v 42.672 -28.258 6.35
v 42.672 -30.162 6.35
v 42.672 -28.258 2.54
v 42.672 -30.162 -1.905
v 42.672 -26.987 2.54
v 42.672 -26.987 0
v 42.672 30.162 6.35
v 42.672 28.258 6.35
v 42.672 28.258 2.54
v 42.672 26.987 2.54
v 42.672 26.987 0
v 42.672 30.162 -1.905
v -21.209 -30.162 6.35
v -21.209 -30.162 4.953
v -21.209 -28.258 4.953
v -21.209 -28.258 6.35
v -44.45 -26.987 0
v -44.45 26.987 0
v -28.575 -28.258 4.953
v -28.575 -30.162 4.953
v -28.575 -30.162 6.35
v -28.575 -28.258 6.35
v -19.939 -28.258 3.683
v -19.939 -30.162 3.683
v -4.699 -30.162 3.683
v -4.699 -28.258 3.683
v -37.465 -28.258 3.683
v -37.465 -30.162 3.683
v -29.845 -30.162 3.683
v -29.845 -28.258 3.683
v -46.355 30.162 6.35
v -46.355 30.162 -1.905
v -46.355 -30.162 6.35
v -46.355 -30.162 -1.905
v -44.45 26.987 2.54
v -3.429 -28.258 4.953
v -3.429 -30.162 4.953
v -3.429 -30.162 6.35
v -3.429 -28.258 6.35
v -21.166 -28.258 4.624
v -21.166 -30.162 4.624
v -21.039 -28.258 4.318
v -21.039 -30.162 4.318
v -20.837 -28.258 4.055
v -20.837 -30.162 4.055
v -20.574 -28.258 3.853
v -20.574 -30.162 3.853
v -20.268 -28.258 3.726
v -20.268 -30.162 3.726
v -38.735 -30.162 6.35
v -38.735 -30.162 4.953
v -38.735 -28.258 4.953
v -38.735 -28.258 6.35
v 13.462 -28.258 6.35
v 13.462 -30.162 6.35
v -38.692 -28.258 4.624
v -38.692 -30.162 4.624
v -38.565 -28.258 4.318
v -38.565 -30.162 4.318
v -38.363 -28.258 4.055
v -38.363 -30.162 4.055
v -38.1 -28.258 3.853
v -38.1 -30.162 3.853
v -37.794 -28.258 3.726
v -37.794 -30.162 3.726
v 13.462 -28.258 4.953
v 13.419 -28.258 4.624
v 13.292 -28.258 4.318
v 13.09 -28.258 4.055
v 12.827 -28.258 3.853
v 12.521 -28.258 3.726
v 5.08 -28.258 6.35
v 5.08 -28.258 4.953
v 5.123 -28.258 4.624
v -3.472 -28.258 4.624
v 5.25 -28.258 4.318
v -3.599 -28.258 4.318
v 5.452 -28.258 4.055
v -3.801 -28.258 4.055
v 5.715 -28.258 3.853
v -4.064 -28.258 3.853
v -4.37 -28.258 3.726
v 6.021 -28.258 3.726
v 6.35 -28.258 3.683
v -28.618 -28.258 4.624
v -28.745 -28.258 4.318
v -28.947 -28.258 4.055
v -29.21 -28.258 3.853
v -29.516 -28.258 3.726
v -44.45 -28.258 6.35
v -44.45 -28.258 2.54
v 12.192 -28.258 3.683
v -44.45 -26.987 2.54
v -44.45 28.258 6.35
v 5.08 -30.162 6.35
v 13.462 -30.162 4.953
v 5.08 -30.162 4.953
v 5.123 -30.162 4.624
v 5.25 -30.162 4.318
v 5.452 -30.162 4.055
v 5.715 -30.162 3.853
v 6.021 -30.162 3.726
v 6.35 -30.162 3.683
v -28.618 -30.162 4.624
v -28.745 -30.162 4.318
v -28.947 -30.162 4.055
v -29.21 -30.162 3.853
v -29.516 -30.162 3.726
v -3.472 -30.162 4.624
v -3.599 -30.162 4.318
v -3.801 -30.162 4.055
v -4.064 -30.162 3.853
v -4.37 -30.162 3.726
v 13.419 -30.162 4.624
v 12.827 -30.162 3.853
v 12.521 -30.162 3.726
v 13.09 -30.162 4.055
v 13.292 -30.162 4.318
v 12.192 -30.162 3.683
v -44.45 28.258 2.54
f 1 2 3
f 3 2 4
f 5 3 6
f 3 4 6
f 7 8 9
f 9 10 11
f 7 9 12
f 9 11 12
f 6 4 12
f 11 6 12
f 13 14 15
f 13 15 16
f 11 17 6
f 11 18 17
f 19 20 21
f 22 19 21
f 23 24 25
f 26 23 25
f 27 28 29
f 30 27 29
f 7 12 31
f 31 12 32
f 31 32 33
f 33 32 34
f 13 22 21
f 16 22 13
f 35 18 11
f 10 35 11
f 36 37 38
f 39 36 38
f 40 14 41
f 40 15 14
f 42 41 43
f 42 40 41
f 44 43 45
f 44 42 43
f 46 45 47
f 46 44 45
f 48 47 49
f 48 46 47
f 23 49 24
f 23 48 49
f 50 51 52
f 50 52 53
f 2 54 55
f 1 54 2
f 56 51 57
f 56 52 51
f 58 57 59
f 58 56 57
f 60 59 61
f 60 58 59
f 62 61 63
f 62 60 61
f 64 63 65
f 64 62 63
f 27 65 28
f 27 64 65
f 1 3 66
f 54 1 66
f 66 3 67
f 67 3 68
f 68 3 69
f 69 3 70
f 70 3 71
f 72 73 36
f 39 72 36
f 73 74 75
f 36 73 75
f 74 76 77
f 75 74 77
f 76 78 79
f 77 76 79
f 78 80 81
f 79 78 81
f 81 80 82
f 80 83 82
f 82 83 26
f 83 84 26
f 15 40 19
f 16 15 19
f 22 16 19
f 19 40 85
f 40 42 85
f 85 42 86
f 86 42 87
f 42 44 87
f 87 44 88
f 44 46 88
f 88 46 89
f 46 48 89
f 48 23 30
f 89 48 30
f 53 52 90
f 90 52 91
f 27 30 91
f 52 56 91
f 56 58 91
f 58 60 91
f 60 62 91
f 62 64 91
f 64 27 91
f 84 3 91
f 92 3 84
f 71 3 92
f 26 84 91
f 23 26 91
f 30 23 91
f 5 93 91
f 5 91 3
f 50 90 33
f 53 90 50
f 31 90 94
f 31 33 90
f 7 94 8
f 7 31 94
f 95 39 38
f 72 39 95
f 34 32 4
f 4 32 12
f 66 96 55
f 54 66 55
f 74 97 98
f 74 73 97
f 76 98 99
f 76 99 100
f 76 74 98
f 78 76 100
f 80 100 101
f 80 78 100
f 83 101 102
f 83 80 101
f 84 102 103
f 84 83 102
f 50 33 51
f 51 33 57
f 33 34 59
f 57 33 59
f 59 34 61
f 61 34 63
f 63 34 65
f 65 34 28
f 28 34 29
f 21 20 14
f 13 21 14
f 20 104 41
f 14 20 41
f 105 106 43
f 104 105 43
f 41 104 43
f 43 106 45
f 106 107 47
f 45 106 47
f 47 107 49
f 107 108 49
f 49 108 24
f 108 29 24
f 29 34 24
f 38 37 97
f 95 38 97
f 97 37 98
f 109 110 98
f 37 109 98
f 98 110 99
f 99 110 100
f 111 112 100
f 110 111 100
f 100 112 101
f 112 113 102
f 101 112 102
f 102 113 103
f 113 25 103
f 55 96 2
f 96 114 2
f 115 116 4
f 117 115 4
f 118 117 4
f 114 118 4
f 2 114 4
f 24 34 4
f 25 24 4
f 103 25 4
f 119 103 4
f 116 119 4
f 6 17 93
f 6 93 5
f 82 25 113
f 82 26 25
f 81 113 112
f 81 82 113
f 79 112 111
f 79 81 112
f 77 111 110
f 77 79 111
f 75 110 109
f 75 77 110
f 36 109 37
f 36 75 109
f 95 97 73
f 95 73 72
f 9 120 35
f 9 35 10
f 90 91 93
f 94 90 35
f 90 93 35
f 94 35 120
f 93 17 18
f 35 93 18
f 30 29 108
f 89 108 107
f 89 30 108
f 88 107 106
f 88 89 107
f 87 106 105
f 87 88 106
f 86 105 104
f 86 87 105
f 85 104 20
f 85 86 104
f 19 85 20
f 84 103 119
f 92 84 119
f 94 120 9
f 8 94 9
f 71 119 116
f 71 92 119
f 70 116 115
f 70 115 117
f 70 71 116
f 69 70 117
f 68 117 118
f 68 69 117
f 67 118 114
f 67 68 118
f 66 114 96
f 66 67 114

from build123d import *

# Parameters (mm, degrees)
F0_W     = 89.027
F0_H     = 60.325
F1_DEPTH = 1.905
F3_DEPTH = 6.35
F4_W     = 87.122
F4_H     = 1.27
F5_DEPTH = 2.54
F6_W     = 10.16
F6_H     = 2.667
F6_W_2   = 17.78
F6_W_3   = 8.382
F7_DEPTH = 25.4
F8_R     = 1.27


with BuildPart() as f1:
    # F0 (on Top) → F1 (new body)
    with BuildSketch(Plane.XY):
        with Locations((-1.8415, 0)):
            Rectangle(F0_W, F0_H)
    extrude(amount=-F1_DEPTH)

    # F2 (on face) → F3 (join)
    with BuildSketch(Plane.XY):
        Polygon((-44.45, -28.2575), (-44.45, 28.2575), (42.672, 28.2575), (42.672, 30.1625), (-46.355, 30.1625), (-46.355, -30.1625), (42.672, -30.1625), (42.672, -28.2575), align=None)
    extrude(amount=F3_DEPTH)

    # F4 (on face) → F5 (join)
    with BuildSketch(Plane.XY):
        with Locations((-0.889, 27.6225)):
            Rectangle(F4_W, F4_H)
        with Locations((-0.889, -27.6225)):
            Rectangle(F4_W, F4_H)
    extrude(amount=F5_DEPTH)

    # F6 (on face) → F7 (cut)
    with BuildSketch(Plane.XZ.offset(30.1625)):
        with Locations((-33.655, 5.0165)):
            Rectangle(F6_W, F6_H)
        with Locations((-12.319, 5.0165)):
            Rectangle(F6_W_2, F6_H)
        with Locations((9.271, 5.0165)):
            Rectangle(F6_W_3, F6_H)
    extrude(amount=-F7_DEPTH, mode=Mode.SUBTRACT)

    # F8
    f8_edges = [f1.edges().sort_by_distance(p)[0] for p in [
        (-38.735, -29.21, 3.683),
        (-28.575, -29.21, 3.683),
        (5.08, -29.21, 3.683),
        (13.462, -29.21, 3.683),
        (-3.429, -29.21, 3.683),
        (-21.209, -29.21, 3.683),
    ]]
    fillet(f8_edges, radius=F8_R)


solid = f1.part
